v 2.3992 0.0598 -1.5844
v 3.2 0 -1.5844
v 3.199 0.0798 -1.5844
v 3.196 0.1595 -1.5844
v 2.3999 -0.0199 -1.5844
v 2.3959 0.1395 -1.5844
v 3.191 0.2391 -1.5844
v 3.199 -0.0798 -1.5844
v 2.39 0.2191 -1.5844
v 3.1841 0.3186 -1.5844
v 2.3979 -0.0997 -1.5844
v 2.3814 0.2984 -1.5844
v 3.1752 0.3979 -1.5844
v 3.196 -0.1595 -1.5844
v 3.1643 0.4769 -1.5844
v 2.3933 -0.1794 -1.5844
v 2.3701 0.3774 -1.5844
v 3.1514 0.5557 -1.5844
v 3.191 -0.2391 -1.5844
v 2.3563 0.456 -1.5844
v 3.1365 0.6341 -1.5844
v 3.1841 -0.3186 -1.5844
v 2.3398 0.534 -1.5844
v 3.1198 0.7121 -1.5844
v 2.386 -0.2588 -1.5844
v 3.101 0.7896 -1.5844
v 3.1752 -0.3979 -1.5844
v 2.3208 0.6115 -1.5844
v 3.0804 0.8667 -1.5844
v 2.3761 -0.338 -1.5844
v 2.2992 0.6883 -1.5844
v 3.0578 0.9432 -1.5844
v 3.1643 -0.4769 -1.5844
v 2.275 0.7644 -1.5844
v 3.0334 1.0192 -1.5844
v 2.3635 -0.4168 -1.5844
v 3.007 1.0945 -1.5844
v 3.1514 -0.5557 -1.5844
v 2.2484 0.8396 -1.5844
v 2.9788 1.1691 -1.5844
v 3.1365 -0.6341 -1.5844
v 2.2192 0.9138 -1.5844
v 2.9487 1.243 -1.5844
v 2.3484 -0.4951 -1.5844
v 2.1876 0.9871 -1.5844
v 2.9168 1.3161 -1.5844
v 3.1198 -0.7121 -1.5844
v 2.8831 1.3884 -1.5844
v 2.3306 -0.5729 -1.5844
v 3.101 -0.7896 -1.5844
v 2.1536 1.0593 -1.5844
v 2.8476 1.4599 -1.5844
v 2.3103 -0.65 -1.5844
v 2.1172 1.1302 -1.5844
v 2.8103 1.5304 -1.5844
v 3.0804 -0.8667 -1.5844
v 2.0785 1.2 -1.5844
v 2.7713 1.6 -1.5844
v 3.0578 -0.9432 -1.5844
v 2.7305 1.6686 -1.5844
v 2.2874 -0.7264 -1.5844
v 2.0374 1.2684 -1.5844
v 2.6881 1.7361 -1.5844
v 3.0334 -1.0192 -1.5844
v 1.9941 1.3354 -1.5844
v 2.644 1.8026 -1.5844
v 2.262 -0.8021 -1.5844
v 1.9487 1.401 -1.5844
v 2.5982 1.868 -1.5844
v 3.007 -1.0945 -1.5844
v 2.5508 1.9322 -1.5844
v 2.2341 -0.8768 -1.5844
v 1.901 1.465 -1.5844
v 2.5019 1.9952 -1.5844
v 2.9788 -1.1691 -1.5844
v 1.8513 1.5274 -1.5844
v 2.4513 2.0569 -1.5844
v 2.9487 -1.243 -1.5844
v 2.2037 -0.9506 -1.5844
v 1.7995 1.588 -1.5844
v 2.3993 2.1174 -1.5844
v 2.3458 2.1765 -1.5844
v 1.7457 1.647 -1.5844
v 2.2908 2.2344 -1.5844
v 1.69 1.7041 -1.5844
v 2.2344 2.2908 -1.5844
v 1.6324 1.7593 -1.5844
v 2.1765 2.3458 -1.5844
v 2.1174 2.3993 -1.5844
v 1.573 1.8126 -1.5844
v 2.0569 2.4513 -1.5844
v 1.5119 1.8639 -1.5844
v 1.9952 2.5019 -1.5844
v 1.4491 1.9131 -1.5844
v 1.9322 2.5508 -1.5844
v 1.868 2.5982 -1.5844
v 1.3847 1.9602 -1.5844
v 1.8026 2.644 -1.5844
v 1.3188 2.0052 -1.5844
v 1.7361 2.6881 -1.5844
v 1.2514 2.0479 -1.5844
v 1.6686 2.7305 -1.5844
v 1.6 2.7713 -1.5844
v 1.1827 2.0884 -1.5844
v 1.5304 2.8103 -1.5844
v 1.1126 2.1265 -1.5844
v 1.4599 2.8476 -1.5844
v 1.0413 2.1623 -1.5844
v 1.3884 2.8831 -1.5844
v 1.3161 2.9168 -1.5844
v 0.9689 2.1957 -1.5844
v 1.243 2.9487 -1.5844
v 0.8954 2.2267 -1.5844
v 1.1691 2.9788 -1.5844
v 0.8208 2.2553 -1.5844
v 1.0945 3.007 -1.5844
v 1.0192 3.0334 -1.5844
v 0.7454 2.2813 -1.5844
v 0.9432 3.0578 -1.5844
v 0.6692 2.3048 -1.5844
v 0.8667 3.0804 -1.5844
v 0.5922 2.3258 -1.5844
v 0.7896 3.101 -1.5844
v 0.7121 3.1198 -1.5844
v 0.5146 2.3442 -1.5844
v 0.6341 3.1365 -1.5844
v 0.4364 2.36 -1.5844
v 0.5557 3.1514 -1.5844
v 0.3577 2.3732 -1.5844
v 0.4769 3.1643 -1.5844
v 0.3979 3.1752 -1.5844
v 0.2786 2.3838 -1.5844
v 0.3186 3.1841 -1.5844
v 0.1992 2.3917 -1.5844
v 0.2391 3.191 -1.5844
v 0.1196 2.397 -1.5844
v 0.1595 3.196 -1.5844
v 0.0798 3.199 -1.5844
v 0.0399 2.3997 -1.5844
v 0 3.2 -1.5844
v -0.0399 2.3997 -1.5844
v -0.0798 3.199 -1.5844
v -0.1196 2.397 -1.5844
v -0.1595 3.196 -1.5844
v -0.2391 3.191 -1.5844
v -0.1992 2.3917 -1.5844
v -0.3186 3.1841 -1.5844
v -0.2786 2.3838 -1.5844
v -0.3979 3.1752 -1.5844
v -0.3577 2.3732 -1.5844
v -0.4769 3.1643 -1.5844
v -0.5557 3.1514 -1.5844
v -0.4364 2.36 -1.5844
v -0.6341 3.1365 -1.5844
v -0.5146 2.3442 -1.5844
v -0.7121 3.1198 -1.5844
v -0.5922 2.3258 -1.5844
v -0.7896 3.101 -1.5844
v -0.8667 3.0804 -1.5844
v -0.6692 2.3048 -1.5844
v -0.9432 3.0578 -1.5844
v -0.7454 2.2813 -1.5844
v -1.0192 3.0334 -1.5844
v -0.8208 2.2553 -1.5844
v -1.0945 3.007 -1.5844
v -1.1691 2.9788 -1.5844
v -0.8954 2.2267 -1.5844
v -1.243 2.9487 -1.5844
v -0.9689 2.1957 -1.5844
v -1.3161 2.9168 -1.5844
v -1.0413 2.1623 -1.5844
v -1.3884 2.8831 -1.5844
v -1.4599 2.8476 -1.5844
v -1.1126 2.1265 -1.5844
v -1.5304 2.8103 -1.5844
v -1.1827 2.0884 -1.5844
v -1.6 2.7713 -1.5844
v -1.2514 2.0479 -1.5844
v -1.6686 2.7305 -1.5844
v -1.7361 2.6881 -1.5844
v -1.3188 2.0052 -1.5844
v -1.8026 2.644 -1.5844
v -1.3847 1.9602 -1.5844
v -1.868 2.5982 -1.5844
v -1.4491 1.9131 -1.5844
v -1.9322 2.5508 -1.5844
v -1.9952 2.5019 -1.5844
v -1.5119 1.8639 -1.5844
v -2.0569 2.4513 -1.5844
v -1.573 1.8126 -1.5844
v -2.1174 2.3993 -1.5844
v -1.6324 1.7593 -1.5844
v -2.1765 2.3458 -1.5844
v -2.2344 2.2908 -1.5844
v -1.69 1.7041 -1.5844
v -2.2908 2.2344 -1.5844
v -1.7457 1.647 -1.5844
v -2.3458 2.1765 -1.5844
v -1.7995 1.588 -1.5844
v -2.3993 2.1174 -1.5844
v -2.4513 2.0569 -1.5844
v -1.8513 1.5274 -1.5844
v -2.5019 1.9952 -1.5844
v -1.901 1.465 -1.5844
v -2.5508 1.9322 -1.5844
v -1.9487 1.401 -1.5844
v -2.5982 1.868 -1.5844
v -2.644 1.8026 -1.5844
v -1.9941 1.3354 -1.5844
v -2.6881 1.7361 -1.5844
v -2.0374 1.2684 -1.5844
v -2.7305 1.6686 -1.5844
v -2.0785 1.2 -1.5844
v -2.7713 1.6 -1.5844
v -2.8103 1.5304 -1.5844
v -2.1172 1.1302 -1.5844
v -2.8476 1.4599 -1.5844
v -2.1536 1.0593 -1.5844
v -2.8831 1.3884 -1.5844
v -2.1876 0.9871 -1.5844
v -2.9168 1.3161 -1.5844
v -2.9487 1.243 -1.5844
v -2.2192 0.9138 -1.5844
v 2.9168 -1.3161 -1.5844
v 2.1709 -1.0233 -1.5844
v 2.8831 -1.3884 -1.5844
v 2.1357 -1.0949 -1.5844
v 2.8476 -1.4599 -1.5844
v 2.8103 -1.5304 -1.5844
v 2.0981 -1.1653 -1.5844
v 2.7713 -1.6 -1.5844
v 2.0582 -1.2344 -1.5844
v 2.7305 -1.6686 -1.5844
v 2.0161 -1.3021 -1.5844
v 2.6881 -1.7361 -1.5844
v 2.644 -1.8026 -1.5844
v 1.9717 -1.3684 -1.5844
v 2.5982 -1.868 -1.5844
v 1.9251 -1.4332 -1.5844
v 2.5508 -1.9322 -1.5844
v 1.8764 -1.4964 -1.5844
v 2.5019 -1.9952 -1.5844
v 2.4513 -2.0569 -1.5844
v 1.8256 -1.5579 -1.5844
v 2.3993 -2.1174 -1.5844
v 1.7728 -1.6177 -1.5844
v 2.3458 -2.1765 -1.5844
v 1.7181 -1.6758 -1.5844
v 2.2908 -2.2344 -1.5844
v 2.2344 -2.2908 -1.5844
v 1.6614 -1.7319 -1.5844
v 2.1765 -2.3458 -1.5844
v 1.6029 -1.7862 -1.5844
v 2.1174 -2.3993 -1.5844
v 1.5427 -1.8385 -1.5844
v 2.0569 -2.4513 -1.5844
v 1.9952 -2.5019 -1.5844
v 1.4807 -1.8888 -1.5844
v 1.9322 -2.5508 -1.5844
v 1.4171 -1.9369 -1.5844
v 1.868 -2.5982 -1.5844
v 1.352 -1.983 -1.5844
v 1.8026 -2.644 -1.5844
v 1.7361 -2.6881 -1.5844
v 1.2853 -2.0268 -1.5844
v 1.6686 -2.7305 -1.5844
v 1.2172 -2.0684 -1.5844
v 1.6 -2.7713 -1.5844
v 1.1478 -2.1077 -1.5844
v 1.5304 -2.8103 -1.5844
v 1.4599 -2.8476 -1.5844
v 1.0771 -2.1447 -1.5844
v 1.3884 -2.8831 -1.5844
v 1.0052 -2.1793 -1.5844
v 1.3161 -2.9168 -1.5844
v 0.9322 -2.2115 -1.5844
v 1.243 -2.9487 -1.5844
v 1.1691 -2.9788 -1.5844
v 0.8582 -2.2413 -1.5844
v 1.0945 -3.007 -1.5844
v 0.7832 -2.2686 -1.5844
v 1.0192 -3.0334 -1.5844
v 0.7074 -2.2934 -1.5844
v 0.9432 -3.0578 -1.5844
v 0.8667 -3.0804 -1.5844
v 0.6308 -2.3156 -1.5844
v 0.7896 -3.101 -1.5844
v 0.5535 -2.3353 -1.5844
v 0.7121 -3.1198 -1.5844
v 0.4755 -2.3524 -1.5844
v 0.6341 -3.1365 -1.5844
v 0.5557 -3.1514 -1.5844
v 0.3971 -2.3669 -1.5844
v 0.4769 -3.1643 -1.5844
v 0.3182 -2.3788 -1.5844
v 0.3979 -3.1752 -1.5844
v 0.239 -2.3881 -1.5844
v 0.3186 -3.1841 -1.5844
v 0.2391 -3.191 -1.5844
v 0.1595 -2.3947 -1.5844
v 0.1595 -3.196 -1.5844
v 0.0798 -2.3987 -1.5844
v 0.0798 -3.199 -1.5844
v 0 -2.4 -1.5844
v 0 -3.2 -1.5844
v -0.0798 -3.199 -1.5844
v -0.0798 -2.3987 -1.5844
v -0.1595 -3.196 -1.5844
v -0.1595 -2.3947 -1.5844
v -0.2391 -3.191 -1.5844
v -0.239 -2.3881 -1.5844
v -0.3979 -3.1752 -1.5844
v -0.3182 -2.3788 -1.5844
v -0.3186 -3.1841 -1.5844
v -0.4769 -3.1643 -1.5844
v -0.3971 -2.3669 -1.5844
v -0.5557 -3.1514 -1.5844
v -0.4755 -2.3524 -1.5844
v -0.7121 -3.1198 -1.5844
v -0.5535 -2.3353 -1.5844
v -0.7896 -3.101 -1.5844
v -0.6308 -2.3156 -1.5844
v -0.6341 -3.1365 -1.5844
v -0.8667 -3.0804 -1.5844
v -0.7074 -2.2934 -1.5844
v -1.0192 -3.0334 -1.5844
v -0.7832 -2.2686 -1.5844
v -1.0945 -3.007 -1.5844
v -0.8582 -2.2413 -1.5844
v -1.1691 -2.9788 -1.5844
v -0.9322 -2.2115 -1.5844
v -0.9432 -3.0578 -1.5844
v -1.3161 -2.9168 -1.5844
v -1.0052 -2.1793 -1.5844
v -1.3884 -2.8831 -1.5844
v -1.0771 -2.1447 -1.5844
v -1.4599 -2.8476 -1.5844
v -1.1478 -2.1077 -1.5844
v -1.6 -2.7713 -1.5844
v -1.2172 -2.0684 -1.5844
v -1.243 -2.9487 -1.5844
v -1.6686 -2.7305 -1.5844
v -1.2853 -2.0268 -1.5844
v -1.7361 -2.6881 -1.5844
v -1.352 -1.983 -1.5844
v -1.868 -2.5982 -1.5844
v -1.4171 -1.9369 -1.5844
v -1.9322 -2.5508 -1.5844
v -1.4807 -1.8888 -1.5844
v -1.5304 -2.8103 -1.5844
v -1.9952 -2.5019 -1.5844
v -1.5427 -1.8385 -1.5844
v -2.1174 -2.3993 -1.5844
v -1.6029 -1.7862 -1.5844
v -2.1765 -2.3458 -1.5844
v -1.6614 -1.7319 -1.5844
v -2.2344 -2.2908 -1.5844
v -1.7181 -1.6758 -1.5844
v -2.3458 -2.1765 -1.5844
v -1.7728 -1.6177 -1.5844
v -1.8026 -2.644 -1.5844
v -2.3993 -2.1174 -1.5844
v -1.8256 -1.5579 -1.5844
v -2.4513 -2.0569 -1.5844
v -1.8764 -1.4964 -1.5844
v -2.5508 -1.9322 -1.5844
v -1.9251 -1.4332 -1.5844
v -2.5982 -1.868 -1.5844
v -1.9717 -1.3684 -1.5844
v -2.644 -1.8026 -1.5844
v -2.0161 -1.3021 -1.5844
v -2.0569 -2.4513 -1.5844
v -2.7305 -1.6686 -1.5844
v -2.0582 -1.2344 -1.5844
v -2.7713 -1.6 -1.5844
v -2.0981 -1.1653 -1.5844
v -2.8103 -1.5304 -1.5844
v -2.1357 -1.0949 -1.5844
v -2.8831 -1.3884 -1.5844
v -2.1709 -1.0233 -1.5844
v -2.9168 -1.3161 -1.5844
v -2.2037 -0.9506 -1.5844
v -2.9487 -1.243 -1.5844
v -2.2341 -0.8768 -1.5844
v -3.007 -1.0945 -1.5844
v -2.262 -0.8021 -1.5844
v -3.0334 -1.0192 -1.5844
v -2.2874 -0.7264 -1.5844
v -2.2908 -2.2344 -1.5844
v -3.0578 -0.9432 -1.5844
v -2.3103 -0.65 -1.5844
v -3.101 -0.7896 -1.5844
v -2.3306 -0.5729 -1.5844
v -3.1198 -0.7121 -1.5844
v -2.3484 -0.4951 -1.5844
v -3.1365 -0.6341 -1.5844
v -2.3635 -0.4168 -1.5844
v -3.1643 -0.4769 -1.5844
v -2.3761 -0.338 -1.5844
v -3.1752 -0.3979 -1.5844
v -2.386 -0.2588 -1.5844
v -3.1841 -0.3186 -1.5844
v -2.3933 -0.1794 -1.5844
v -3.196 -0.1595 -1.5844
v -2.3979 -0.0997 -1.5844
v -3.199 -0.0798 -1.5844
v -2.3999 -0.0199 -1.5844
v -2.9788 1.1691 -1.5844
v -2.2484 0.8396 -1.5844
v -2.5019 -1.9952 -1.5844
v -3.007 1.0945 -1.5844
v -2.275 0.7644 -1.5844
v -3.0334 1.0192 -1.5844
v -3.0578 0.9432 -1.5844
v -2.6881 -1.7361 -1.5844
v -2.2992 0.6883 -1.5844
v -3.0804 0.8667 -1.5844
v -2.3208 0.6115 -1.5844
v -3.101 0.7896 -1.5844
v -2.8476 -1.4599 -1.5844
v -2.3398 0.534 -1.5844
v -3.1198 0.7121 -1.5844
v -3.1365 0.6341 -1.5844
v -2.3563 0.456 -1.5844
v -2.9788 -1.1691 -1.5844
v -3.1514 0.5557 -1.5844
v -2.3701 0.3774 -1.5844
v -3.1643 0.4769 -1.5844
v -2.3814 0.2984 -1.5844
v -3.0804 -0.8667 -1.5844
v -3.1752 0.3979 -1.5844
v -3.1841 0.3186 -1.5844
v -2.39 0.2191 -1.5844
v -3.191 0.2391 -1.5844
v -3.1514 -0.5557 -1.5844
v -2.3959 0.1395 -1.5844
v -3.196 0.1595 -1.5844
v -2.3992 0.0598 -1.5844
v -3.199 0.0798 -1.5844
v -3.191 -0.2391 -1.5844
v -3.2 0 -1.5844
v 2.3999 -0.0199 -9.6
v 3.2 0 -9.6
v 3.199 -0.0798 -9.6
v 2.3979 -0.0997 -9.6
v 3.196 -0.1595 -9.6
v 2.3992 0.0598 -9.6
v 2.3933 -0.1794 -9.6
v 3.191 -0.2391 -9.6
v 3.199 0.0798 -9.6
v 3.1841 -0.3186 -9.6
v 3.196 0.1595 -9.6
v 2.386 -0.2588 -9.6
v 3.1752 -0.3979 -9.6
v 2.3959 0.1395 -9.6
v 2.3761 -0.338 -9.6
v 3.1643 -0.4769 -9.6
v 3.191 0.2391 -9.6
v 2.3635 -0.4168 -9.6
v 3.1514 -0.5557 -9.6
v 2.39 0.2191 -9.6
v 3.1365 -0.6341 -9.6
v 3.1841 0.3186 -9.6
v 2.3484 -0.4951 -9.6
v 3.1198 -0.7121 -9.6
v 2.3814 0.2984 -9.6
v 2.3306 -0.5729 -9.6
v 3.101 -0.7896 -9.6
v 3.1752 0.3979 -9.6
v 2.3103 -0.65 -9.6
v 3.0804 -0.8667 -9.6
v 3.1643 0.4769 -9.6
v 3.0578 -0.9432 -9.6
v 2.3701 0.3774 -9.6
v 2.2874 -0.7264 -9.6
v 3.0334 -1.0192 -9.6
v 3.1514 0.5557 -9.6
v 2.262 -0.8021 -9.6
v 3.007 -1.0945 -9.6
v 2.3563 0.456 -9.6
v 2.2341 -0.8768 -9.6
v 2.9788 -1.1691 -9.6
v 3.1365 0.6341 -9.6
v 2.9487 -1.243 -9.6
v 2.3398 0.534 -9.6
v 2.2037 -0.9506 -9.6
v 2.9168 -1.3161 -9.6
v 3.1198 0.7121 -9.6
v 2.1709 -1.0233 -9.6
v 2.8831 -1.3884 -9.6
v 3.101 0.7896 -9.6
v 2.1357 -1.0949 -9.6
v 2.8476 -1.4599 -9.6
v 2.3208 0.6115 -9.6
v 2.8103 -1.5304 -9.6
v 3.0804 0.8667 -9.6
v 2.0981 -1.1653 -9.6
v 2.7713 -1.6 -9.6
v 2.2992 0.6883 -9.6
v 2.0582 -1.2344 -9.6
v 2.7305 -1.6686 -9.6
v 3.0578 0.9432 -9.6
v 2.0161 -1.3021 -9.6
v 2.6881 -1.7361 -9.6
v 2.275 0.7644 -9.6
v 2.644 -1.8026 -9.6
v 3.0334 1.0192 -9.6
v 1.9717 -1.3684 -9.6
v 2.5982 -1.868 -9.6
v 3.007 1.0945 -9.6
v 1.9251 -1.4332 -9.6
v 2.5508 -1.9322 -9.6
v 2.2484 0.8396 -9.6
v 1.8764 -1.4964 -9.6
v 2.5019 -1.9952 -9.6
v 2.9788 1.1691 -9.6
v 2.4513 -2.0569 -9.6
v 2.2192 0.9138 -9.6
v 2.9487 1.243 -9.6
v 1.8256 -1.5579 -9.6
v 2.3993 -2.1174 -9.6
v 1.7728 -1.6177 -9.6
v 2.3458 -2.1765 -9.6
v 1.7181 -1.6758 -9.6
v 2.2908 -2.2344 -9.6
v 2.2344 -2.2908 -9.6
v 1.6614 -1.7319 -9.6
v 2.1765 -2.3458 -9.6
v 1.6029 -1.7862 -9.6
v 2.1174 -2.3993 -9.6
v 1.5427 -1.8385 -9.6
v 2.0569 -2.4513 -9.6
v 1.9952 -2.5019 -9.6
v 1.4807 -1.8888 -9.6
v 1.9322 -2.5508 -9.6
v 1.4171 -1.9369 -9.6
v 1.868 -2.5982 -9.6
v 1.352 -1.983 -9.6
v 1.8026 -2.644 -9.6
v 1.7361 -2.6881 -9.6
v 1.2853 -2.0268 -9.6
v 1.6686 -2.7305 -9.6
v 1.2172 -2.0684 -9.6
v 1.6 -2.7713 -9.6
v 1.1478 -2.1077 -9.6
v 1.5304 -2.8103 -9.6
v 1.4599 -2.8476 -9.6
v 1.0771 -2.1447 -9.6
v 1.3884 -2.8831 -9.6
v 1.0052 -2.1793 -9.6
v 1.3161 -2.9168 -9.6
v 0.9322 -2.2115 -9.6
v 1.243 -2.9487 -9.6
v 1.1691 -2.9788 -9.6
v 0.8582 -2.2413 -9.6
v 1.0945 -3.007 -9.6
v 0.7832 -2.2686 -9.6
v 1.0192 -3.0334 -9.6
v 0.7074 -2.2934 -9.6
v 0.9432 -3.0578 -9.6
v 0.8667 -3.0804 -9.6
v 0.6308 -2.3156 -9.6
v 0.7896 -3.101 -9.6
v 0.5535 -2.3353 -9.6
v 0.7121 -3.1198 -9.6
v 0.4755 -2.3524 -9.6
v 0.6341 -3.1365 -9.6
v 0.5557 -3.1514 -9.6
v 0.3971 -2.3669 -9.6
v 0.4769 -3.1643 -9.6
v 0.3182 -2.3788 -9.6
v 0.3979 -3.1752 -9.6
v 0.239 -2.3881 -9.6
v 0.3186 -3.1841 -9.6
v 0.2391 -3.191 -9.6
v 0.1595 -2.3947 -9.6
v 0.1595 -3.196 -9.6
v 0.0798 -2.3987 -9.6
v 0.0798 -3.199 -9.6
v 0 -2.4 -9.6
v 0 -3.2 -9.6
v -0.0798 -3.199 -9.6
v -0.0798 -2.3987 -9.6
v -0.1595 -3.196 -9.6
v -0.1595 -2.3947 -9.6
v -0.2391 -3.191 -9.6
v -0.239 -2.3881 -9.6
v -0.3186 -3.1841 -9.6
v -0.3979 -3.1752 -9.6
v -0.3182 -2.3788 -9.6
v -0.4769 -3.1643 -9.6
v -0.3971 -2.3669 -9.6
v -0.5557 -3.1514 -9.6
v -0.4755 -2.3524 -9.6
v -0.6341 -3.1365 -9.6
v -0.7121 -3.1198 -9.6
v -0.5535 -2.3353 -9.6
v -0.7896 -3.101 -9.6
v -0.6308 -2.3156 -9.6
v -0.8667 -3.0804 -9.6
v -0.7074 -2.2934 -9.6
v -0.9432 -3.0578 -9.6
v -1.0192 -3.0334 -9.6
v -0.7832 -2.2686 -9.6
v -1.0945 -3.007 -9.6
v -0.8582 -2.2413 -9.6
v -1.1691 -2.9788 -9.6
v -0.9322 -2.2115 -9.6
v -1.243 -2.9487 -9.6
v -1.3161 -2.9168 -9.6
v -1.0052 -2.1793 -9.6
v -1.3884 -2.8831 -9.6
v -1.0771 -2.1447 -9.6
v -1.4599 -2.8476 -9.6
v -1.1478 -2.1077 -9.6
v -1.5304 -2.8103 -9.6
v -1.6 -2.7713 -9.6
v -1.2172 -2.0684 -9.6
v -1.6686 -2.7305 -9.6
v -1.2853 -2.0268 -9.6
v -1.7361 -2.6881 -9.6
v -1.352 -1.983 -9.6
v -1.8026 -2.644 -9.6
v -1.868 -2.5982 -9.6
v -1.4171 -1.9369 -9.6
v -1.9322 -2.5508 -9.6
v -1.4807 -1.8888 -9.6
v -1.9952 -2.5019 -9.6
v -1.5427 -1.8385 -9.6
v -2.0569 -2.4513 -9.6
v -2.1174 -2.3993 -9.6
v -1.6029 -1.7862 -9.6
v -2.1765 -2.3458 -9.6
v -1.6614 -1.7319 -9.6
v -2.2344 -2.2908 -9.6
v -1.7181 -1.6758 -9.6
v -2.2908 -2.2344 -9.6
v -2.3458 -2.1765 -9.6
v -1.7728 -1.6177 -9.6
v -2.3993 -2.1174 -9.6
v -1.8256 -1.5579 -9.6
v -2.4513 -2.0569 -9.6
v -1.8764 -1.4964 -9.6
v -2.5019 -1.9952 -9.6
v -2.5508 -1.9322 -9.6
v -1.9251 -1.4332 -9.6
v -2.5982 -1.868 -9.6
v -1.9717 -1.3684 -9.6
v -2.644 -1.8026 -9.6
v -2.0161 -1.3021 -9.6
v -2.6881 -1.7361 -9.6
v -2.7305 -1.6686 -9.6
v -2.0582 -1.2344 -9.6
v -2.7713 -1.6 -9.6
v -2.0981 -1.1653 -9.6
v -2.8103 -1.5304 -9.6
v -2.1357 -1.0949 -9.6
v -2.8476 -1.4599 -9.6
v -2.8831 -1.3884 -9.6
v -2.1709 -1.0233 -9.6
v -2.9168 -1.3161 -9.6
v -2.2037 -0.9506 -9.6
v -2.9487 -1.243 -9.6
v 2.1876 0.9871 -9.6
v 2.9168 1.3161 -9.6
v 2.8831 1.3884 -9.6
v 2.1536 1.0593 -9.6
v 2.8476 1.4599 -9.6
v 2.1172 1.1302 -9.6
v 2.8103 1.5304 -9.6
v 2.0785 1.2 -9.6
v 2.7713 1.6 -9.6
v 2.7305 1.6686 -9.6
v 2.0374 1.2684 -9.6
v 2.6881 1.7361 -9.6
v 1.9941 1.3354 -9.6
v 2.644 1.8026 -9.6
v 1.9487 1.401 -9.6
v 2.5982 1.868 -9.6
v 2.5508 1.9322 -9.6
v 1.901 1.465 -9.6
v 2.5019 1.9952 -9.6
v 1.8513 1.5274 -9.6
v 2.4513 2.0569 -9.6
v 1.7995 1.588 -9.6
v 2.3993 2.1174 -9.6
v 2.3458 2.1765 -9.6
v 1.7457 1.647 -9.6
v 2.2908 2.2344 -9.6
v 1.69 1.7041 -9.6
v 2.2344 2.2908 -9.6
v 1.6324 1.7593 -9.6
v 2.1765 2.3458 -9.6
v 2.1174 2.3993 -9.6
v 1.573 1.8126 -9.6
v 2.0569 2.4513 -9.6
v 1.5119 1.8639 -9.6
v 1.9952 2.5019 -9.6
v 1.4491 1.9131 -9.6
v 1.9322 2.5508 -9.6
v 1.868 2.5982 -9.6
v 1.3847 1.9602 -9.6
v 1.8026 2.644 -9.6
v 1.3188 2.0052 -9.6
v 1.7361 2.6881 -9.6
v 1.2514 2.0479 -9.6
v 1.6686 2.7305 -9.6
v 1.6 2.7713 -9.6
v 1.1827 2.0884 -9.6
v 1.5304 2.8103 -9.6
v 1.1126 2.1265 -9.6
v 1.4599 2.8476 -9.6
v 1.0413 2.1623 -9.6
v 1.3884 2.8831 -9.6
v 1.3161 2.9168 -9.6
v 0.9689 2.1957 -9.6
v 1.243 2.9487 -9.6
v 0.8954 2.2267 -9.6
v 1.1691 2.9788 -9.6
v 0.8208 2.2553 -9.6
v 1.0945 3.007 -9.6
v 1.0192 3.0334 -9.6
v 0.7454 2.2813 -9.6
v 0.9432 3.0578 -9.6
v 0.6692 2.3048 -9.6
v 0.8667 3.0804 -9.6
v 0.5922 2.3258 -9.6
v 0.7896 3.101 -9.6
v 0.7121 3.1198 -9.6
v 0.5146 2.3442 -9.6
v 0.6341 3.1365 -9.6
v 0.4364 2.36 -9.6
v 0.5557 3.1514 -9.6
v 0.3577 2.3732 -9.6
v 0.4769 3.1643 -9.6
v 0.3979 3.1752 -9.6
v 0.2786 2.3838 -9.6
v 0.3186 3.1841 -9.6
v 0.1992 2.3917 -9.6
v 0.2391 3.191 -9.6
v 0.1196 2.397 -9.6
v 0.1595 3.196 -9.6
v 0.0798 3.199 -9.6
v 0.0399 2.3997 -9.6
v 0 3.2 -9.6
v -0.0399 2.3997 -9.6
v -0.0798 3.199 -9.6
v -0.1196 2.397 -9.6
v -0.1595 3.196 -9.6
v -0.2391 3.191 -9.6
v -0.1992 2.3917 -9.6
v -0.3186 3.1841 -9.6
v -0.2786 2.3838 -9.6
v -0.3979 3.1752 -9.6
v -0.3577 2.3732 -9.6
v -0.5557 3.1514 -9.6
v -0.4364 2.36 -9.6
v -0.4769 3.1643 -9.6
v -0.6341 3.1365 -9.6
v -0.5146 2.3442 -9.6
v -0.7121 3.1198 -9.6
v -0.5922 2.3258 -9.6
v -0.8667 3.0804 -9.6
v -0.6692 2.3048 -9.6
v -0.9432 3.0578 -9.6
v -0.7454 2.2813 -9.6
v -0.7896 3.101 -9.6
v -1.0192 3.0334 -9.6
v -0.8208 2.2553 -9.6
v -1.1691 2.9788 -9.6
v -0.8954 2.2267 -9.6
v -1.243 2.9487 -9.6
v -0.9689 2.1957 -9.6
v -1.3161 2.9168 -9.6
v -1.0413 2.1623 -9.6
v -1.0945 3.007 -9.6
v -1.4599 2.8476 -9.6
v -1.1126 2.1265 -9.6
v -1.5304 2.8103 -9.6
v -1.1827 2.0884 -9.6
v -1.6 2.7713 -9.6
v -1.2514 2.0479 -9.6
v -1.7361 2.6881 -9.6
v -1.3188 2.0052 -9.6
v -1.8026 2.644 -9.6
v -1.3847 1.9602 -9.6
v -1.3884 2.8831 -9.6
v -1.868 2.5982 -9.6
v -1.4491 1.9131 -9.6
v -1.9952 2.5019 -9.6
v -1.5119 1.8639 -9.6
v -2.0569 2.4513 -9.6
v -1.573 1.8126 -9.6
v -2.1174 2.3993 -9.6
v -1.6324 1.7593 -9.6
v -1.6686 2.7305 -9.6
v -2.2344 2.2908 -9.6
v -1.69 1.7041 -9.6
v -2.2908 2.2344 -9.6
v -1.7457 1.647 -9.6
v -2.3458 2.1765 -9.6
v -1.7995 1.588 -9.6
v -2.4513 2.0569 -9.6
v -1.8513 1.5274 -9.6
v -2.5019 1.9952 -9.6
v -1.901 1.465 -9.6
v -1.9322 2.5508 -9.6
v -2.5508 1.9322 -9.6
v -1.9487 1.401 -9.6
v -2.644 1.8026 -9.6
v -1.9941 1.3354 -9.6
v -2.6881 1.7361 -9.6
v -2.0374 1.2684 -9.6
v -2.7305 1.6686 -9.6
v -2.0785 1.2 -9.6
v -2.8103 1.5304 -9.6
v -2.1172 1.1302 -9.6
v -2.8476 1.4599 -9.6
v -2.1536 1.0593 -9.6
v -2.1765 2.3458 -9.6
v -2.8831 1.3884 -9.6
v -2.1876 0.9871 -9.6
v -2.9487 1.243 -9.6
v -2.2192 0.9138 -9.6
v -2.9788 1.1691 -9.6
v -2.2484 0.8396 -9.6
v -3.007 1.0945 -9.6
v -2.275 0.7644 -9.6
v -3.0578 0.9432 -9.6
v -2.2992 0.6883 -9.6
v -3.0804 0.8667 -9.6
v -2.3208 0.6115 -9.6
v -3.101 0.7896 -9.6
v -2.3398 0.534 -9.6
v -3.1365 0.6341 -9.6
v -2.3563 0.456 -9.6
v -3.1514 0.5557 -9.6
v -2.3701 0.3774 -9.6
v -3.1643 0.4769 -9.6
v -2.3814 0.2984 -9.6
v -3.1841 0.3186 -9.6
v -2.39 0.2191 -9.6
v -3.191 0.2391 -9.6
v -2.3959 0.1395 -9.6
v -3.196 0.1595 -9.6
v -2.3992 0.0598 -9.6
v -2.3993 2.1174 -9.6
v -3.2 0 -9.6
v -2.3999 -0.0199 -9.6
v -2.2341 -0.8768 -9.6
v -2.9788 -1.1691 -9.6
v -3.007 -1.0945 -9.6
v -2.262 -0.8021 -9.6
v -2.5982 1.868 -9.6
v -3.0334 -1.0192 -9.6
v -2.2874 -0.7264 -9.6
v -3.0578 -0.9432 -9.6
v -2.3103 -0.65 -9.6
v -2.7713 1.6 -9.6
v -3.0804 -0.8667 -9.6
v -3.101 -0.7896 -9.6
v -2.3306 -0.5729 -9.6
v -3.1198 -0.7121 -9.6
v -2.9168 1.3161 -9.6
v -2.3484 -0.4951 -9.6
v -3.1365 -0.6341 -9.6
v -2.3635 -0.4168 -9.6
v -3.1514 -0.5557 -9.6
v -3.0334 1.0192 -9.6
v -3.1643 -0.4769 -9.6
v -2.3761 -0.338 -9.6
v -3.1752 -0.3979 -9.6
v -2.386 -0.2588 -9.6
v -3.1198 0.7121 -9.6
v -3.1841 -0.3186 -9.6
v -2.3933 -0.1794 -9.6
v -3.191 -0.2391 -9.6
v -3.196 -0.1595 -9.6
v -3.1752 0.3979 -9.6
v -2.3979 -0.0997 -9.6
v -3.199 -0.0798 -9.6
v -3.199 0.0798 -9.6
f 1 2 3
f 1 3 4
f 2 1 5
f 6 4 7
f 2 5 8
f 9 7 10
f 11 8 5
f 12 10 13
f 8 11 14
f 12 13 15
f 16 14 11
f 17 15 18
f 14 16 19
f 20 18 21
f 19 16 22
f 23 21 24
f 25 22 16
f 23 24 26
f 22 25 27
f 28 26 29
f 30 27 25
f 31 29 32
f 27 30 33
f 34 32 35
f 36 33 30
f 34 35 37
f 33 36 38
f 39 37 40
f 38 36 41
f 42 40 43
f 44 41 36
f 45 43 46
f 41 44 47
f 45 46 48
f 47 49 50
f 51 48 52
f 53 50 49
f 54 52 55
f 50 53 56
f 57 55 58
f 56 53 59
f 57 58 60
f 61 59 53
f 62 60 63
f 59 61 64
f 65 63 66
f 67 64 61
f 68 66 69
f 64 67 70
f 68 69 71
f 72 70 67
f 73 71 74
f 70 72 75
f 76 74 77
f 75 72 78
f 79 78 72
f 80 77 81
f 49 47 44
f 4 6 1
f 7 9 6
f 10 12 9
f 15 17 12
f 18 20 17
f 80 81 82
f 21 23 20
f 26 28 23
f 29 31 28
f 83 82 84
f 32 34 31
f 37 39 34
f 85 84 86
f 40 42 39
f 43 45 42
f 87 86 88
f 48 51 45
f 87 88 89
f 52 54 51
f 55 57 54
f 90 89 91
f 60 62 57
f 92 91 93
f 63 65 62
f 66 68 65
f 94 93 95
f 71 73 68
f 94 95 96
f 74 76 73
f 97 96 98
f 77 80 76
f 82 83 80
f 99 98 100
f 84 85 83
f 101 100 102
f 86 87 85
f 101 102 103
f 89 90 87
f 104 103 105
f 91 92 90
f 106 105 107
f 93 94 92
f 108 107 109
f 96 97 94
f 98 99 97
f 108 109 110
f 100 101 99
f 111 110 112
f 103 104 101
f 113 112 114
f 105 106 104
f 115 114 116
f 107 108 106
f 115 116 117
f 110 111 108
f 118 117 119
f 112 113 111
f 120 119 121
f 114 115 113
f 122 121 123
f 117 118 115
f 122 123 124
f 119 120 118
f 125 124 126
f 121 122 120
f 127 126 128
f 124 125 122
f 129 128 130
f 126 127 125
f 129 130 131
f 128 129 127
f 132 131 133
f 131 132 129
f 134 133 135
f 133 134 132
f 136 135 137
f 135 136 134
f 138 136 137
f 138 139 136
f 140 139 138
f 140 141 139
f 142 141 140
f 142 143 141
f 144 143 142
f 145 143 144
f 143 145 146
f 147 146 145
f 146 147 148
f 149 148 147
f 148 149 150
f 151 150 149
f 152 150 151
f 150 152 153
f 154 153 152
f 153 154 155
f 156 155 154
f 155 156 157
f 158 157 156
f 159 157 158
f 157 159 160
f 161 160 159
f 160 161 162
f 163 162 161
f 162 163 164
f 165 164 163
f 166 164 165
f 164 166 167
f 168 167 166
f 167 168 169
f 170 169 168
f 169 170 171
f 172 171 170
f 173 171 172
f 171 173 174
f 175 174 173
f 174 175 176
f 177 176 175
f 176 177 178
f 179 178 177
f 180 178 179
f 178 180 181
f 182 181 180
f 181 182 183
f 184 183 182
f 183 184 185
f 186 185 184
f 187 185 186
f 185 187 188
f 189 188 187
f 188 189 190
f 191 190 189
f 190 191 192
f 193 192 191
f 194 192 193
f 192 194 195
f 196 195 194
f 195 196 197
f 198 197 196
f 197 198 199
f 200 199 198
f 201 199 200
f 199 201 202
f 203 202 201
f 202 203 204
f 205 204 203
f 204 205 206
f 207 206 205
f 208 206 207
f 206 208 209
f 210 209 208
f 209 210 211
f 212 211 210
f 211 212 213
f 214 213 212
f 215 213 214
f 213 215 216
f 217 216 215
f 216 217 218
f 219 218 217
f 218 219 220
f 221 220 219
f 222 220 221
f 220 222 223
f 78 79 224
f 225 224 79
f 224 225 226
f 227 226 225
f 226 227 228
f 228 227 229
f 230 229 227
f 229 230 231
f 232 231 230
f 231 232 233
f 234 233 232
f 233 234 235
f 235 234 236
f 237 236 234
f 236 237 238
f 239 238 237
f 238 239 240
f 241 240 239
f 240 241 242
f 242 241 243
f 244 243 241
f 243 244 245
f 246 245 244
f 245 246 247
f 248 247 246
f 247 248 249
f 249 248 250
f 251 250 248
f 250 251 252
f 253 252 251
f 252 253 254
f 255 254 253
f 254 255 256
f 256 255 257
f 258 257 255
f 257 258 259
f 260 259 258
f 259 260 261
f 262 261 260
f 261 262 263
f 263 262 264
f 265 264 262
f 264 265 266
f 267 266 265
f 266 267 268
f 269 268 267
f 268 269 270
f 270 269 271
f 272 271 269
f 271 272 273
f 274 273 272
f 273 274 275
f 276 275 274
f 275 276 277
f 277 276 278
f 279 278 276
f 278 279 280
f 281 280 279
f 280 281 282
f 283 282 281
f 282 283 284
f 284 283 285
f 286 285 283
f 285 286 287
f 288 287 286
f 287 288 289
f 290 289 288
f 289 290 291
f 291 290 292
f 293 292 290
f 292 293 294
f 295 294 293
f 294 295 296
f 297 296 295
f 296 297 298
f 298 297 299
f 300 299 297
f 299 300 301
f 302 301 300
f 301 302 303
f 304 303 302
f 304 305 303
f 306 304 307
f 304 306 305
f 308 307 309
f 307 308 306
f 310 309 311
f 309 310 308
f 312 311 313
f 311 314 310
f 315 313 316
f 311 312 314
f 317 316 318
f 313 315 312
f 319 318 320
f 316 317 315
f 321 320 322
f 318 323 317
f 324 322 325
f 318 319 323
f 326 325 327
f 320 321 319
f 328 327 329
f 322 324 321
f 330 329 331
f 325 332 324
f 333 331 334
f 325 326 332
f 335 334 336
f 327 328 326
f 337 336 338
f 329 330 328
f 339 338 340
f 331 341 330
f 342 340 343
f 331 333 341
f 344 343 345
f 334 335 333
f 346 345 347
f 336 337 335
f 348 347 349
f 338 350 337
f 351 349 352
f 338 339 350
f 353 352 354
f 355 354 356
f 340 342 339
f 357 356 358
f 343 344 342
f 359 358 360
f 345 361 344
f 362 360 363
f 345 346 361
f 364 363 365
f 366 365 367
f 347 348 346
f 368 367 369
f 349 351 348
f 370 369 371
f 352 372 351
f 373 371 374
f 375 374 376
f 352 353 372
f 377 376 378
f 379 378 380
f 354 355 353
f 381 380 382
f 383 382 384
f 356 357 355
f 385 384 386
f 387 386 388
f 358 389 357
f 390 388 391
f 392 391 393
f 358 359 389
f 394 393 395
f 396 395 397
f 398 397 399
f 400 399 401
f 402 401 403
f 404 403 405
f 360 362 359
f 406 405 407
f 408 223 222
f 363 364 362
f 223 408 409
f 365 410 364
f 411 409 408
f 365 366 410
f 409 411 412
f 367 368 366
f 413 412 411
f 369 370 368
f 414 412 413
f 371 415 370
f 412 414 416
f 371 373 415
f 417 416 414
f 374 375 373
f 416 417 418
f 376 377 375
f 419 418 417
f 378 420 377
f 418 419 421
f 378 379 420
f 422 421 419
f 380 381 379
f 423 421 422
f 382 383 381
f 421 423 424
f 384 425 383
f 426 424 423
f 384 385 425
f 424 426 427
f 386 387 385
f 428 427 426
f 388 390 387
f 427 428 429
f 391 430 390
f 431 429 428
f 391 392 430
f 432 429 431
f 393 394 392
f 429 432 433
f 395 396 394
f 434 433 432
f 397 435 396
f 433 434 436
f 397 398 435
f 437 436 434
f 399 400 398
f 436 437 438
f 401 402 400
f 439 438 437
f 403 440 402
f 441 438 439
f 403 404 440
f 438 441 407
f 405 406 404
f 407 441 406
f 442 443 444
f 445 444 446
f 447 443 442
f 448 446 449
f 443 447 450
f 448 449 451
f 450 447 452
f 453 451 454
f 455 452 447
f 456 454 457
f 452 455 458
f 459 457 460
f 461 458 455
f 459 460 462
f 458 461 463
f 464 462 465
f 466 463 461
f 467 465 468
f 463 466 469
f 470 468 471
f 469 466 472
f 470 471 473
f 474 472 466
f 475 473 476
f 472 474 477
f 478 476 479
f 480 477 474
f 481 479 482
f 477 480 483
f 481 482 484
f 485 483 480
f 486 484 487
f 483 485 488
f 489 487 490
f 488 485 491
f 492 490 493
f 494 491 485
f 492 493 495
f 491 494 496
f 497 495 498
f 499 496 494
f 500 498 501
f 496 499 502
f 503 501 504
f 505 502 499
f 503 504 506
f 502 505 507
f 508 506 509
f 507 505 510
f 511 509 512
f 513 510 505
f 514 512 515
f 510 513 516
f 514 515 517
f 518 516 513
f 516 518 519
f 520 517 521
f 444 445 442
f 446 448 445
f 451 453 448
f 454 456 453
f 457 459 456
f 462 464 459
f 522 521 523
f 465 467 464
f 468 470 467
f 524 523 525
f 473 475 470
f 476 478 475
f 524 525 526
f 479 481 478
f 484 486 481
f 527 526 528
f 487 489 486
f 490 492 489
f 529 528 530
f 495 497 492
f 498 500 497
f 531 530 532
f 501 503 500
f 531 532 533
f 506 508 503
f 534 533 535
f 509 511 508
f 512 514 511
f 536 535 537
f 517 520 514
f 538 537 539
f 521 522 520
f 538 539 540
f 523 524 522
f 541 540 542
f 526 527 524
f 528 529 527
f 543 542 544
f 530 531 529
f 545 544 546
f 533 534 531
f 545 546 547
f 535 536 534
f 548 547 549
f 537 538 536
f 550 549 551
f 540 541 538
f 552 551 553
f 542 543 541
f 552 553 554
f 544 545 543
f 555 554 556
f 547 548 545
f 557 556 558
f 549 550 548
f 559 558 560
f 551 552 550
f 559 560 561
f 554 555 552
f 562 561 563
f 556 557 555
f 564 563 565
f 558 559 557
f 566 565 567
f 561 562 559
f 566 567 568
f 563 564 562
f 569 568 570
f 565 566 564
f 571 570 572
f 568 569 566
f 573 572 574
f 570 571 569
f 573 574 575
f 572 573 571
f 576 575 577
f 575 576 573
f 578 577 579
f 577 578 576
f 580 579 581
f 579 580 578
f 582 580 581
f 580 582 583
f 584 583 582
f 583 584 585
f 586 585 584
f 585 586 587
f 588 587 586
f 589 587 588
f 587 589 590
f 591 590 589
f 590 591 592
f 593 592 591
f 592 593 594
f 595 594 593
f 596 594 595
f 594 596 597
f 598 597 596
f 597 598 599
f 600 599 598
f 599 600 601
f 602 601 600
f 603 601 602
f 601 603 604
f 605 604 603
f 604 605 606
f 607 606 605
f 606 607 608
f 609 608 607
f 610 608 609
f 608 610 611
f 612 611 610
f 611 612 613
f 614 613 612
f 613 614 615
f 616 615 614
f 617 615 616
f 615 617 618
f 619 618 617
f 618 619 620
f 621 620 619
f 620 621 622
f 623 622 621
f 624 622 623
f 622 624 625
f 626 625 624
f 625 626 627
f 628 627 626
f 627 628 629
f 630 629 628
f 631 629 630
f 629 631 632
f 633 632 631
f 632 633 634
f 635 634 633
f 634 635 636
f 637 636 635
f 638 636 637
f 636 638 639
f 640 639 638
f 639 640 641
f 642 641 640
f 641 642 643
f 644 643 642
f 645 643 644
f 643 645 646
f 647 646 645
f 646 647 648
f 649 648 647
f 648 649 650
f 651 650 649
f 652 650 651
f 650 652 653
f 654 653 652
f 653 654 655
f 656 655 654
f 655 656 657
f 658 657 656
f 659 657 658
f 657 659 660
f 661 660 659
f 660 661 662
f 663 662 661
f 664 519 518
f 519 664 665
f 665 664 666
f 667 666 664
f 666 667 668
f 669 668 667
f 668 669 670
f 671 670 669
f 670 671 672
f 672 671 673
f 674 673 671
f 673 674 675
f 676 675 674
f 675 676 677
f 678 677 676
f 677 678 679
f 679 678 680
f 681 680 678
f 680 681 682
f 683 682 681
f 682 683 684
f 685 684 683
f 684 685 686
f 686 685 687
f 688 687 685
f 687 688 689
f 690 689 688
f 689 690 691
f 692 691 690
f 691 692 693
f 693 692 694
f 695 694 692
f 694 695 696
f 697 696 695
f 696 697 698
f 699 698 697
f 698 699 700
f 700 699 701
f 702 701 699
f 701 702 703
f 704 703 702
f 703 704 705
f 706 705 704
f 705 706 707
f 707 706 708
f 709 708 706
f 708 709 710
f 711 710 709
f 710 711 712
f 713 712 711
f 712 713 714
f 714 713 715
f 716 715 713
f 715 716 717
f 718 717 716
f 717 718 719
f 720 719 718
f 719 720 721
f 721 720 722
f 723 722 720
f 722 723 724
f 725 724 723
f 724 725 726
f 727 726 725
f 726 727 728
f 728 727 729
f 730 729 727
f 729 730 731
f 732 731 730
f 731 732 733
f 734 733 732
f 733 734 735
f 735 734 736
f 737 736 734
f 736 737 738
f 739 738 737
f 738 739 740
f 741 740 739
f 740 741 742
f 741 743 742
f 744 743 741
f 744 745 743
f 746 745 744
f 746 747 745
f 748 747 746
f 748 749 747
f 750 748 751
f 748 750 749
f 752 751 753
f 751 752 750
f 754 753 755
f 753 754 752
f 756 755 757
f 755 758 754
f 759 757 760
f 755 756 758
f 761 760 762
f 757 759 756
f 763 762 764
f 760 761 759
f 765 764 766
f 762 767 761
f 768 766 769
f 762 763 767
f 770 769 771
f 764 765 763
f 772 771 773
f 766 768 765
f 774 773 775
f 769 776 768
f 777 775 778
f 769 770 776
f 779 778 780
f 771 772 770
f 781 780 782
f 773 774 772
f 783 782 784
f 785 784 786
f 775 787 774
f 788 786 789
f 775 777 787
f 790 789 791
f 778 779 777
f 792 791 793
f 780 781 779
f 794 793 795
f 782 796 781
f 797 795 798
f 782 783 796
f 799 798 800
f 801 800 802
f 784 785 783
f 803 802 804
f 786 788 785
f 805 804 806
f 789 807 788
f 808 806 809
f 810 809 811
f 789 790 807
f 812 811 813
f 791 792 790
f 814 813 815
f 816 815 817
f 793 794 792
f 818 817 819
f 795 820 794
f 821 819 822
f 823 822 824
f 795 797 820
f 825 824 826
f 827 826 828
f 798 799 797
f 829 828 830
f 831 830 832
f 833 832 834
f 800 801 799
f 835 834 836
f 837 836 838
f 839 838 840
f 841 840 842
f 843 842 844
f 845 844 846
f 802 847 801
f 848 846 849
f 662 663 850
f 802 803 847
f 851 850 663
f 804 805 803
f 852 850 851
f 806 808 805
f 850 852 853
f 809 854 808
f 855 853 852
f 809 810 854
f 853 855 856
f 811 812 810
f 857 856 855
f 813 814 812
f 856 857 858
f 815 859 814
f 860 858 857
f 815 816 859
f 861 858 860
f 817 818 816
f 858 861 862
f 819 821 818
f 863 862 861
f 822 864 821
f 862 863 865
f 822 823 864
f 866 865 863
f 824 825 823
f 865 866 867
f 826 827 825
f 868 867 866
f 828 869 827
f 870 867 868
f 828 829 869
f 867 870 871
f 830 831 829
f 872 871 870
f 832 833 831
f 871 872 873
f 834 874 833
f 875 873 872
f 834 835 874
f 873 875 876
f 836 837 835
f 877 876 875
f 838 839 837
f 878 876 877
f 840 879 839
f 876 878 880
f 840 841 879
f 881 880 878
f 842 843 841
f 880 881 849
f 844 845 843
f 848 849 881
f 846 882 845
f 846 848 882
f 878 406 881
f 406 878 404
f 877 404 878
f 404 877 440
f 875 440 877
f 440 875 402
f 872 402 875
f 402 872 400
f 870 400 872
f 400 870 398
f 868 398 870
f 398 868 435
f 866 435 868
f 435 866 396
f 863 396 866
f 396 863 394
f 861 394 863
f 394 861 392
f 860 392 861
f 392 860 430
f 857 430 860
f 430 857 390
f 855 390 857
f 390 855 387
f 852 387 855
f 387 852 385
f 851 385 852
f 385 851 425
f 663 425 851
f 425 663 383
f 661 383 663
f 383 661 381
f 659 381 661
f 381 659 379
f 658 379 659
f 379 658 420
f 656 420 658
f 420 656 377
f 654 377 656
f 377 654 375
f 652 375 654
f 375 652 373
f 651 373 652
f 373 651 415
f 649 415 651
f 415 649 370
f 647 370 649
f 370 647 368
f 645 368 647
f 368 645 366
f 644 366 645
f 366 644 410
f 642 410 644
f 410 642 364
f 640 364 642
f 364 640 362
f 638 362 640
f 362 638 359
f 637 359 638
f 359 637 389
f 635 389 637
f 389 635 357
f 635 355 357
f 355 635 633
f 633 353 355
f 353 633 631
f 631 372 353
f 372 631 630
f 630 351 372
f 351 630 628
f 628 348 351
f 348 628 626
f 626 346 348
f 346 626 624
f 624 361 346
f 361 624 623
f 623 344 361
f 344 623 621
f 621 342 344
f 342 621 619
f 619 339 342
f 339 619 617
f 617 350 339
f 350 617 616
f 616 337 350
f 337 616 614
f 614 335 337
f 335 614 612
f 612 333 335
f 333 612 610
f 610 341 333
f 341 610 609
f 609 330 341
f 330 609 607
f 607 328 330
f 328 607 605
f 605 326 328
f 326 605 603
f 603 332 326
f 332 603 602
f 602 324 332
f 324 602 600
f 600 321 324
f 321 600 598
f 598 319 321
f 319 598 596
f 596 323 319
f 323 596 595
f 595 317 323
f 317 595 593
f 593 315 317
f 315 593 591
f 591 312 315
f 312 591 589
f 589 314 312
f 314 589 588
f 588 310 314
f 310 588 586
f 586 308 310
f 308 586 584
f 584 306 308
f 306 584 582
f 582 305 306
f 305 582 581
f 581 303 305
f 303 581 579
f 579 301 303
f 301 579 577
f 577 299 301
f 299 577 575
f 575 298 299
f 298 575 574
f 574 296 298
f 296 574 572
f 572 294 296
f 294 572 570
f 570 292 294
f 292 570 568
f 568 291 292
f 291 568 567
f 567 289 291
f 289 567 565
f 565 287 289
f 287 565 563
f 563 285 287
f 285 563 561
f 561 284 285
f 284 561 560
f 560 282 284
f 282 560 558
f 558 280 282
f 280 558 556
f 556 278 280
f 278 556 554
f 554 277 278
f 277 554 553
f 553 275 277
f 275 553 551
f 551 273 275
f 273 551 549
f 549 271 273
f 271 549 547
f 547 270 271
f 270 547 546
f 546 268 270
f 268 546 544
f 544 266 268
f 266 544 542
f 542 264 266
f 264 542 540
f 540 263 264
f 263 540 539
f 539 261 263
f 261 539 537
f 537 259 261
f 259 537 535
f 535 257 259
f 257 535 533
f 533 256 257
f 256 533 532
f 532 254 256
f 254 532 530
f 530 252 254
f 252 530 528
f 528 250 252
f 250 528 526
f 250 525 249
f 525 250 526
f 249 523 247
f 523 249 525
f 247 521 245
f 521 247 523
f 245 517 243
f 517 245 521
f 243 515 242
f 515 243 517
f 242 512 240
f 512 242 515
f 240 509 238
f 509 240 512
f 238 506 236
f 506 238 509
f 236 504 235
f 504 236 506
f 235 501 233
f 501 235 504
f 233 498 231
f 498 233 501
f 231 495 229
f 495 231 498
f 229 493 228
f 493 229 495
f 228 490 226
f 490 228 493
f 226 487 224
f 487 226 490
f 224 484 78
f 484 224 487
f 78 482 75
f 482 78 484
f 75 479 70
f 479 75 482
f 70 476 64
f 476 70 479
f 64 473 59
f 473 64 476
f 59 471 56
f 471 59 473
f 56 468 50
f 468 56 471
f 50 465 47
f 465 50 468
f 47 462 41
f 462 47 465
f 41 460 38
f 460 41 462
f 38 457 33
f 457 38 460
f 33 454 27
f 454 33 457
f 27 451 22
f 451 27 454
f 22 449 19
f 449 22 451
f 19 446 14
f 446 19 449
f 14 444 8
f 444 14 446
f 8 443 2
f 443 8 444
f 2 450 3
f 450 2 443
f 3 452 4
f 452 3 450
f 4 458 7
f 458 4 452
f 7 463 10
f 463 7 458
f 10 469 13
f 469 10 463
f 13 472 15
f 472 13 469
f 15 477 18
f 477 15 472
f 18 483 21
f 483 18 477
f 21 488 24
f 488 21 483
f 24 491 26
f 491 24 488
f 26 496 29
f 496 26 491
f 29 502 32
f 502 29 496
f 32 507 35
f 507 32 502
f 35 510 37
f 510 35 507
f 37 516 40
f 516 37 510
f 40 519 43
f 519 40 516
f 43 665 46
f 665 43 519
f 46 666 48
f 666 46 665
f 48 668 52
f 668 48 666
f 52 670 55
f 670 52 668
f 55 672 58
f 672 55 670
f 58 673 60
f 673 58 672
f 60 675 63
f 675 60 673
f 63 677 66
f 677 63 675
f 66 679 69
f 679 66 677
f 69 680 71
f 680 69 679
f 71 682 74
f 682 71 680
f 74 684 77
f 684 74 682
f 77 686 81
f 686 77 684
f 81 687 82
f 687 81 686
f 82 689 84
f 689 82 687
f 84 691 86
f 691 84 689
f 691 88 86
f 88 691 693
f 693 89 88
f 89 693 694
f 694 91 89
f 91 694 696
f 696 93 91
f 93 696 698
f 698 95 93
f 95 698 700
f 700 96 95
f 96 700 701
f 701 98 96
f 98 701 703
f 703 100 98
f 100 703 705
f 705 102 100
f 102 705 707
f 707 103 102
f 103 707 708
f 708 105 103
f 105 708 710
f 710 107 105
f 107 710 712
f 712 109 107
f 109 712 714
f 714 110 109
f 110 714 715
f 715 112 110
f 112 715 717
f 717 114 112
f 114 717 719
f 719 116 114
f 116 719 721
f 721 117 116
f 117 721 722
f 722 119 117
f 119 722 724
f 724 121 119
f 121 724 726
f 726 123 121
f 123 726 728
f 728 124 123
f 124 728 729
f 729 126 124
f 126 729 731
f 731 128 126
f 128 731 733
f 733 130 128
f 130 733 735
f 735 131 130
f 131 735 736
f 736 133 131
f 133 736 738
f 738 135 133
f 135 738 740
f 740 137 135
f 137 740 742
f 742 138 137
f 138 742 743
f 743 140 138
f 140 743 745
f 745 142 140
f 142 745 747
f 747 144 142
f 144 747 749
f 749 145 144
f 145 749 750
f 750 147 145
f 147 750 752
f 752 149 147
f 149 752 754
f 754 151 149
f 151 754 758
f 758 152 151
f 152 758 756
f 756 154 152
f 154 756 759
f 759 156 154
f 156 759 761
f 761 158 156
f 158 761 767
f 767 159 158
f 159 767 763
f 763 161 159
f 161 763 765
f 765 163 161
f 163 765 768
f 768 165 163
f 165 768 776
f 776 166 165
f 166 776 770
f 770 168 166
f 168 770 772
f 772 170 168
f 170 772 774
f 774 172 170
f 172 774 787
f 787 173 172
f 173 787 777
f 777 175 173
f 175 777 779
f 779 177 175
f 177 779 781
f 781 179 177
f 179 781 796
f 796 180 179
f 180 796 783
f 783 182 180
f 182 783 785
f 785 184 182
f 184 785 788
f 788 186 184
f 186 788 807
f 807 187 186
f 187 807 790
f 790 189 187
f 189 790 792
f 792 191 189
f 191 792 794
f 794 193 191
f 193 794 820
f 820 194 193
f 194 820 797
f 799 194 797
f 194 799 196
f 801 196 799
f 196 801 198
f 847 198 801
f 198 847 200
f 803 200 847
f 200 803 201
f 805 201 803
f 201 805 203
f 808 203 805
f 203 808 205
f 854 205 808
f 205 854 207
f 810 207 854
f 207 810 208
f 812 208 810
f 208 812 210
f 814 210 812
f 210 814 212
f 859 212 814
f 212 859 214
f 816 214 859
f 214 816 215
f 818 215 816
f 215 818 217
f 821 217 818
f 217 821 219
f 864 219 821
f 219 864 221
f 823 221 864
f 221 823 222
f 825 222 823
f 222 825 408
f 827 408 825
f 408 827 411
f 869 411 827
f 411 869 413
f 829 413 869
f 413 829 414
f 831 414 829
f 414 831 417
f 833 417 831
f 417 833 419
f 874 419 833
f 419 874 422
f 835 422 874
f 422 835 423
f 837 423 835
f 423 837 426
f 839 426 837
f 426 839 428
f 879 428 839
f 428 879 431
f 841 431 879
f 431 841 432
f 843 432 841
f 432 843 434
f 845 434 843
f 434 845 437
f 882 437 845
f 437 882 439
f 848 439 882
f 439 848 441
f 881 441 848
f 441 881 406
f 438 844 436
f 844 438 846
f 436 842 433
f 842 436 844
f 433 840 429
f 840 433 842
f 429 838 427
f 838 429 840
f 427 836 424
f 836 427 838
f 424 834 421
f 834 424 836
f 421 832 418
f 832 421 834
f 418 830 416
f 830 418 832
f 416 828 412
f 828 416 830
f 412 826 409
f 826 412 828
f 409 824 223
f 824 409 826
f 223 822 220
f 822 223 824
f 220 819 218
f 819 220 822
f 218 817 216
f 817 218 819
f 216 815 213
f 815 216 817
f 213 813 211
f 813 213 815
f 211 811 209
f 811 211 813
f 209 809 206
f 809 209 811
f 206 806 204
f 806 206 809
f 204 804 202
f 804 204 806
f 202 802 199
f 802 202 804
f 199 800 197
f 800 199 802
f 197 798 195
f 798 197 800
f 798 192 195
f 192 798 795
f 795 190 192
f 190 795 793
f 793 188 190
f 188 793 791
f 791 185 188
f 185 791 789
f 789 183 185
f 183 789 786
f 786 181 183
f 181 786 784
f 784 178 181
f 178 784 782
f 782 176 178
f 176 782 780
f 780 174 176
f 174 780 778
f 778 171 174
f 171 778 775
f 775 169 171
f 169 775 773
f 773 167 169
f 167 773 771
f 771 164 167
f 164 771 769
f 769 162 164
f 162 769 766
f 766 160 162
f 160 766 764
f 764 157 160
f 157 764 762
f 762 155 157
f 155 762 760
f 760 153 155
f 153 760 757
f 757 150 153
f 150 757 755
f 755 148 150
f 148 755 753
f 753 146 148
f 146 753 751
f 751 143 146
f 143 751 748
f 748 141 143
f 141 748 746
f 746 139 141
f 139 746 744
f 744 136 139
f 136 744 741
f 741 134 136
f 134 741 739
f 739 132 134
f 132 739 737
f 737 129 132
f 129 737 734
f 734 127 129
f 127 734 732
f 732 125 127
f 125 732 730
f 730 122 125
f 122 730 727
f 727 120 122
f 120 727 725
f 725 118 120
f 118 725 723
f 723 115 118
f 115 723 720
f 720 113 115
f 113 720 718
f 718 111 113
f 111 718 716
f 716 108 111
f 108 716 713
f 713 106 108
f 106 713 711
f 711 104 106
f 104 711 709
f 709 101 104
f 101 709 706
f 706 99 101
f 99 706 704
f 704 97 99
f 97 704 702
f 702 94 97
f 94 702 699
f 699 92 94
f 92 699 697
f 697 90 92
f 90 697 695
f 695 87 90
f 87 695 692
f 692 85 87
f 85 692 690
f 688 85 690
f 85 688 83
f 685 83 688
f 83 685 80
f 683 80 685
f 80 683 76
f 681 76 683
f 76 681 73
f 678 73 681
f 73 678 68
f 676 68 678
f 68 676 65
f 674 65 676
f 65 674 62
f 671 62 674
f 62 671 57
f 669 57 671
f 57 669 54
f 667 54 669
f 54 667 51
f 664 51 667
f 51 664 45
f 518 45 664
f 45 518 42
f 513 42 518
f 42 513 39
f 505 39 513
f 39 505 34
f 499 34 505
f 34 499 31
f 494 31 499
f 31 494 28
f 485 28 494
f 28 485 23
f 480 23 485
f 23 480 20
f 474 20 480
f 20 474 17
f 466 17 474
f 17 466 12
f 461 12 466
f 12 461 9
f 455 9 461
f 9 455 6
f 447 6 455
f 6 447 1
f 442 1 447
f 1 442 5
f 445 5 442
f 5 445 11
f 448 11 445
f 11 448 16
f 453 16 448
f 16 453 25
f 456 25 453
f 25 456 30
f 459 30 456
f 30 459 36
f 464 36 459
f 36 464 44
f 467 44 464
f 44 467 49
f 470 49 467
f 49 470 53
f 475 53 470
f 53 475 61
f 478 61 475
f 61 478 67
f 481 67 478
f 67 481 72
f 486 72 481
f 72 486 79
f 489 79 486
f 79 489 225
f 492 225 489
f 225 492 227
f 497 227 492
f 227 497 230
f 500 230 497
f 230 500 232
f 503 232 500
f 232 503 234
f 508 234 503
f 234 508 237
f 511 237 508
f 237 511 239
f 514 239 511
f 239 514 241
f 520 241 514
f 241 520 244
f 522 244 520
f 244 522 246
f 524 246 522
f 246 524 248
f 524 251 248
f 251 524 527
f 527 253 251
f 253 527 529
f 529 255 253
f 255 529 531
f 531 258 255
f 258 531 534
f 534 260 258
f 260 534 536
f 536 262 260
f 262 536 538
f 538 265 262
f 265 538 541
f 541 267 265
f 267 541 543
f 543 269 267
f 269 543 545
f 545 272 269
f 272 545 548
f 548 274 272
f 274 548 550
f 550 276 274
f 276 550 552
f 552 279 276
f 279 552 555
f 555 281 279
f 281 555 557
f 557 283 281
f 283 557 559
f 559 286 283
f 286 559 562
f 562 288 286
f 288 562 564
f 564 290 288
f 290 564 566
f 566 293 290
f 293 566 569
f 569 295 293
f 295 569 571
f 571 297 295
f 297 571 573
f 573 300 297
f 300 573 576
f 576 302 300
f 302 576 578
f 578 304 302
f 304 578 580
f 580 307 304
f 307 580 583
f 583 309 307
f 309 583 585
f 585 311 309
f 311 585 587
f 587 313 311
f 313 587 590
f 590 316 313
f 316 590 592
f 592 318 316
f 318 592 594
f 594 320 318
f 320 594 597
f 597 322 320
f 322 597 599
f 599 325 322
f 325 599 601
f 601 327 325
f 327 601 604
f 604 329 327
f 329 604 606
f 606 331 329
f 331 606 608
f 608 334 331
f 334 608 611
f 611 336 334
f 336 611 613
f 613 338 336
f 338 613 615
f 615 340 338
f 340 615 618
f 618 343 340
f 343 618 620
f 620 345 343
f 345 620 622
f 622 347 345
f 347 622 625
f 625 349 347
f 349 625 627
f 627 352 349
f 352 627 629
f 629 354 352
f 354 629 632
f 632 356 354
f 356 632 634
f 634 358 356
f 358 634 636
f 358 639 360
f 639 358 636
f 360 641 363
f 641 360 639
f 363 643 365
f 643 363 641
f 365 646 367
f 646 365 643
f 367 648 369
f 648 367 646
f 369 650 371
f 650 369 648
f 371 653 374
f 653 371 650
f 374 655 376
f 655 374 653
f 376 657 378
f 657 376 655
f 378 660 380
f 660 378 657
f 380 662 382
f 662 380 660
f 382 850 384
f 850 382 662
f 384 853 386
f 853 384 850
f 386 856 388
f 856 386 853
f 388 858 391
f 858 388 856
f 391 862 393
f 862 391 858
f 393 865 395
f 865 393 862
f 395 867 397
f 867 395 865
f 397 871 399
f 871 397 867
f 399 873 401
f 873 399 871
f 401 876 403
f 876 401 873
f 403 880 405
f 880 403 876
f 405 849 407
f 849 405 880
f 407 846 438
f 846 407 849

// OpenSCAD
use <../lib.scad>
use <../p/4-4edge.scad>
use <../p/box5.scad>
use <../p/connect.scad>
use <../p/stud4.scad>
$fa=1; $fs=0.2;
function ldraw_lib__4729(realsolid=false) = [
// 0 Brick  2 x  2 no Studs with Pin Vertical
// 0 Name: 4729.dat
// 0 Author: James Jessiman
// 0 !LDRAW_ORG Part UPDATE 2003-03
// 0 !LICENSE Licensed under CC BY 2.0 and CC BY 4.0 : see CAreadme.txt
// 
// 0 BFC CERTIFY CCW
  [0,"BFC","CERTIFY"],
  [0,"BFC","CCW"],
// 
// 0 !HISTORY 2003-06-09 [jriley] BFC compliant
// 0 !HISTORY 2003-11-04 [OrionP] Fixed L3P Errors
// 0 !HISTORY 2003-12-19 [PTadmin] Official Update 2003-03
// 0 !HISTORY 2007-07-08 [PTadmin] Header formatted for Contributor Agreement
// 0 !HISTORY 2008-07-01 [PTadmin] Official Update 2008-01
// 
// 
// 1 16 0 4 0 1 0 0 0 -5 0 0 0 1 stud4.dat
  [1,16,0,4,0,1,0,0,0,-5,0,0,0,1, ldraw_lib__stud4(realsolid)],
// 0 BFC INVERTNEXT
  [0,"BFC","INVERTNEXT"],
// 1 16 0 24 0 16 0 0 0 -20 0 0 0 16 box5.dat
  [1,16,0,24,0,16,0,0,0,-20,0,0,0,16, ldraw_lib__box5(realsolid)],
// 4 16 20 24 20 16 24 16 -16 24 16 -20 24 20
  [4,16,20,24,20,16,24,16,-16,24,16,-20,24,20],
// 4 16 -20 24 20 -16 24 16 -16 24 -16 -20 24 -20
  [4,16,-20,24,20,-16,24,16,-16,24,-16,-20,24,-20],
// 4 16 -20 24 -20 -16 24 -16 16 24 -16 20 24 -20
  [4,16,-20,24,-20,-16,24,-16,16,24,-16,20,24,-20],
// 4 16 20 24 -20 16 24 -16 16 24 16 20 24 20
  [4,16,20,24,-20,16,24,-16,16,24,16,20,24,20],
// 1 16 0 24 0 20 0 0 0 -24 0 0 0 20 box5.dat
  [1,16,0,24,0,20,0,0,0,-24,0,0,0,20, ldraw_lib__box5(realsolid)],
// 1 16 0 0 0 4 0 0 0 1 0 0 0 4 4-4edge.dat
  [1,16,0,0,0,4,0,0,0,1,0,0,0,4, ldraw_lib__4_4edge(realsolid)],
// 1 16 0 0 0 8 0 0 0 1 0 0 0 8 4-4edge.dat
  [1,16,0,0,0,8,0,0,0,1,0,0,0,8, ldraw_lib__4_4edge(realsolid)],
// 1 16 0 0 0 1 0 0 0 1 0 0 0 1 connect.dat
  [1,16,0,0,0,1,0,0,0,1,0,0,0,1, ldraw_lib__connect(realsolid)],
// 0
];
module ldraw_lib__4729(step=0, col=false, unit=2/5, alt=false, line=0.2, solid=!$preview)
    makepoly(ldraw_lib__4729(solid), step=step, col=col, unit=unit, alt=alt, line=line, solid=solid);
ldraw_lib__4729(line=0.2);
